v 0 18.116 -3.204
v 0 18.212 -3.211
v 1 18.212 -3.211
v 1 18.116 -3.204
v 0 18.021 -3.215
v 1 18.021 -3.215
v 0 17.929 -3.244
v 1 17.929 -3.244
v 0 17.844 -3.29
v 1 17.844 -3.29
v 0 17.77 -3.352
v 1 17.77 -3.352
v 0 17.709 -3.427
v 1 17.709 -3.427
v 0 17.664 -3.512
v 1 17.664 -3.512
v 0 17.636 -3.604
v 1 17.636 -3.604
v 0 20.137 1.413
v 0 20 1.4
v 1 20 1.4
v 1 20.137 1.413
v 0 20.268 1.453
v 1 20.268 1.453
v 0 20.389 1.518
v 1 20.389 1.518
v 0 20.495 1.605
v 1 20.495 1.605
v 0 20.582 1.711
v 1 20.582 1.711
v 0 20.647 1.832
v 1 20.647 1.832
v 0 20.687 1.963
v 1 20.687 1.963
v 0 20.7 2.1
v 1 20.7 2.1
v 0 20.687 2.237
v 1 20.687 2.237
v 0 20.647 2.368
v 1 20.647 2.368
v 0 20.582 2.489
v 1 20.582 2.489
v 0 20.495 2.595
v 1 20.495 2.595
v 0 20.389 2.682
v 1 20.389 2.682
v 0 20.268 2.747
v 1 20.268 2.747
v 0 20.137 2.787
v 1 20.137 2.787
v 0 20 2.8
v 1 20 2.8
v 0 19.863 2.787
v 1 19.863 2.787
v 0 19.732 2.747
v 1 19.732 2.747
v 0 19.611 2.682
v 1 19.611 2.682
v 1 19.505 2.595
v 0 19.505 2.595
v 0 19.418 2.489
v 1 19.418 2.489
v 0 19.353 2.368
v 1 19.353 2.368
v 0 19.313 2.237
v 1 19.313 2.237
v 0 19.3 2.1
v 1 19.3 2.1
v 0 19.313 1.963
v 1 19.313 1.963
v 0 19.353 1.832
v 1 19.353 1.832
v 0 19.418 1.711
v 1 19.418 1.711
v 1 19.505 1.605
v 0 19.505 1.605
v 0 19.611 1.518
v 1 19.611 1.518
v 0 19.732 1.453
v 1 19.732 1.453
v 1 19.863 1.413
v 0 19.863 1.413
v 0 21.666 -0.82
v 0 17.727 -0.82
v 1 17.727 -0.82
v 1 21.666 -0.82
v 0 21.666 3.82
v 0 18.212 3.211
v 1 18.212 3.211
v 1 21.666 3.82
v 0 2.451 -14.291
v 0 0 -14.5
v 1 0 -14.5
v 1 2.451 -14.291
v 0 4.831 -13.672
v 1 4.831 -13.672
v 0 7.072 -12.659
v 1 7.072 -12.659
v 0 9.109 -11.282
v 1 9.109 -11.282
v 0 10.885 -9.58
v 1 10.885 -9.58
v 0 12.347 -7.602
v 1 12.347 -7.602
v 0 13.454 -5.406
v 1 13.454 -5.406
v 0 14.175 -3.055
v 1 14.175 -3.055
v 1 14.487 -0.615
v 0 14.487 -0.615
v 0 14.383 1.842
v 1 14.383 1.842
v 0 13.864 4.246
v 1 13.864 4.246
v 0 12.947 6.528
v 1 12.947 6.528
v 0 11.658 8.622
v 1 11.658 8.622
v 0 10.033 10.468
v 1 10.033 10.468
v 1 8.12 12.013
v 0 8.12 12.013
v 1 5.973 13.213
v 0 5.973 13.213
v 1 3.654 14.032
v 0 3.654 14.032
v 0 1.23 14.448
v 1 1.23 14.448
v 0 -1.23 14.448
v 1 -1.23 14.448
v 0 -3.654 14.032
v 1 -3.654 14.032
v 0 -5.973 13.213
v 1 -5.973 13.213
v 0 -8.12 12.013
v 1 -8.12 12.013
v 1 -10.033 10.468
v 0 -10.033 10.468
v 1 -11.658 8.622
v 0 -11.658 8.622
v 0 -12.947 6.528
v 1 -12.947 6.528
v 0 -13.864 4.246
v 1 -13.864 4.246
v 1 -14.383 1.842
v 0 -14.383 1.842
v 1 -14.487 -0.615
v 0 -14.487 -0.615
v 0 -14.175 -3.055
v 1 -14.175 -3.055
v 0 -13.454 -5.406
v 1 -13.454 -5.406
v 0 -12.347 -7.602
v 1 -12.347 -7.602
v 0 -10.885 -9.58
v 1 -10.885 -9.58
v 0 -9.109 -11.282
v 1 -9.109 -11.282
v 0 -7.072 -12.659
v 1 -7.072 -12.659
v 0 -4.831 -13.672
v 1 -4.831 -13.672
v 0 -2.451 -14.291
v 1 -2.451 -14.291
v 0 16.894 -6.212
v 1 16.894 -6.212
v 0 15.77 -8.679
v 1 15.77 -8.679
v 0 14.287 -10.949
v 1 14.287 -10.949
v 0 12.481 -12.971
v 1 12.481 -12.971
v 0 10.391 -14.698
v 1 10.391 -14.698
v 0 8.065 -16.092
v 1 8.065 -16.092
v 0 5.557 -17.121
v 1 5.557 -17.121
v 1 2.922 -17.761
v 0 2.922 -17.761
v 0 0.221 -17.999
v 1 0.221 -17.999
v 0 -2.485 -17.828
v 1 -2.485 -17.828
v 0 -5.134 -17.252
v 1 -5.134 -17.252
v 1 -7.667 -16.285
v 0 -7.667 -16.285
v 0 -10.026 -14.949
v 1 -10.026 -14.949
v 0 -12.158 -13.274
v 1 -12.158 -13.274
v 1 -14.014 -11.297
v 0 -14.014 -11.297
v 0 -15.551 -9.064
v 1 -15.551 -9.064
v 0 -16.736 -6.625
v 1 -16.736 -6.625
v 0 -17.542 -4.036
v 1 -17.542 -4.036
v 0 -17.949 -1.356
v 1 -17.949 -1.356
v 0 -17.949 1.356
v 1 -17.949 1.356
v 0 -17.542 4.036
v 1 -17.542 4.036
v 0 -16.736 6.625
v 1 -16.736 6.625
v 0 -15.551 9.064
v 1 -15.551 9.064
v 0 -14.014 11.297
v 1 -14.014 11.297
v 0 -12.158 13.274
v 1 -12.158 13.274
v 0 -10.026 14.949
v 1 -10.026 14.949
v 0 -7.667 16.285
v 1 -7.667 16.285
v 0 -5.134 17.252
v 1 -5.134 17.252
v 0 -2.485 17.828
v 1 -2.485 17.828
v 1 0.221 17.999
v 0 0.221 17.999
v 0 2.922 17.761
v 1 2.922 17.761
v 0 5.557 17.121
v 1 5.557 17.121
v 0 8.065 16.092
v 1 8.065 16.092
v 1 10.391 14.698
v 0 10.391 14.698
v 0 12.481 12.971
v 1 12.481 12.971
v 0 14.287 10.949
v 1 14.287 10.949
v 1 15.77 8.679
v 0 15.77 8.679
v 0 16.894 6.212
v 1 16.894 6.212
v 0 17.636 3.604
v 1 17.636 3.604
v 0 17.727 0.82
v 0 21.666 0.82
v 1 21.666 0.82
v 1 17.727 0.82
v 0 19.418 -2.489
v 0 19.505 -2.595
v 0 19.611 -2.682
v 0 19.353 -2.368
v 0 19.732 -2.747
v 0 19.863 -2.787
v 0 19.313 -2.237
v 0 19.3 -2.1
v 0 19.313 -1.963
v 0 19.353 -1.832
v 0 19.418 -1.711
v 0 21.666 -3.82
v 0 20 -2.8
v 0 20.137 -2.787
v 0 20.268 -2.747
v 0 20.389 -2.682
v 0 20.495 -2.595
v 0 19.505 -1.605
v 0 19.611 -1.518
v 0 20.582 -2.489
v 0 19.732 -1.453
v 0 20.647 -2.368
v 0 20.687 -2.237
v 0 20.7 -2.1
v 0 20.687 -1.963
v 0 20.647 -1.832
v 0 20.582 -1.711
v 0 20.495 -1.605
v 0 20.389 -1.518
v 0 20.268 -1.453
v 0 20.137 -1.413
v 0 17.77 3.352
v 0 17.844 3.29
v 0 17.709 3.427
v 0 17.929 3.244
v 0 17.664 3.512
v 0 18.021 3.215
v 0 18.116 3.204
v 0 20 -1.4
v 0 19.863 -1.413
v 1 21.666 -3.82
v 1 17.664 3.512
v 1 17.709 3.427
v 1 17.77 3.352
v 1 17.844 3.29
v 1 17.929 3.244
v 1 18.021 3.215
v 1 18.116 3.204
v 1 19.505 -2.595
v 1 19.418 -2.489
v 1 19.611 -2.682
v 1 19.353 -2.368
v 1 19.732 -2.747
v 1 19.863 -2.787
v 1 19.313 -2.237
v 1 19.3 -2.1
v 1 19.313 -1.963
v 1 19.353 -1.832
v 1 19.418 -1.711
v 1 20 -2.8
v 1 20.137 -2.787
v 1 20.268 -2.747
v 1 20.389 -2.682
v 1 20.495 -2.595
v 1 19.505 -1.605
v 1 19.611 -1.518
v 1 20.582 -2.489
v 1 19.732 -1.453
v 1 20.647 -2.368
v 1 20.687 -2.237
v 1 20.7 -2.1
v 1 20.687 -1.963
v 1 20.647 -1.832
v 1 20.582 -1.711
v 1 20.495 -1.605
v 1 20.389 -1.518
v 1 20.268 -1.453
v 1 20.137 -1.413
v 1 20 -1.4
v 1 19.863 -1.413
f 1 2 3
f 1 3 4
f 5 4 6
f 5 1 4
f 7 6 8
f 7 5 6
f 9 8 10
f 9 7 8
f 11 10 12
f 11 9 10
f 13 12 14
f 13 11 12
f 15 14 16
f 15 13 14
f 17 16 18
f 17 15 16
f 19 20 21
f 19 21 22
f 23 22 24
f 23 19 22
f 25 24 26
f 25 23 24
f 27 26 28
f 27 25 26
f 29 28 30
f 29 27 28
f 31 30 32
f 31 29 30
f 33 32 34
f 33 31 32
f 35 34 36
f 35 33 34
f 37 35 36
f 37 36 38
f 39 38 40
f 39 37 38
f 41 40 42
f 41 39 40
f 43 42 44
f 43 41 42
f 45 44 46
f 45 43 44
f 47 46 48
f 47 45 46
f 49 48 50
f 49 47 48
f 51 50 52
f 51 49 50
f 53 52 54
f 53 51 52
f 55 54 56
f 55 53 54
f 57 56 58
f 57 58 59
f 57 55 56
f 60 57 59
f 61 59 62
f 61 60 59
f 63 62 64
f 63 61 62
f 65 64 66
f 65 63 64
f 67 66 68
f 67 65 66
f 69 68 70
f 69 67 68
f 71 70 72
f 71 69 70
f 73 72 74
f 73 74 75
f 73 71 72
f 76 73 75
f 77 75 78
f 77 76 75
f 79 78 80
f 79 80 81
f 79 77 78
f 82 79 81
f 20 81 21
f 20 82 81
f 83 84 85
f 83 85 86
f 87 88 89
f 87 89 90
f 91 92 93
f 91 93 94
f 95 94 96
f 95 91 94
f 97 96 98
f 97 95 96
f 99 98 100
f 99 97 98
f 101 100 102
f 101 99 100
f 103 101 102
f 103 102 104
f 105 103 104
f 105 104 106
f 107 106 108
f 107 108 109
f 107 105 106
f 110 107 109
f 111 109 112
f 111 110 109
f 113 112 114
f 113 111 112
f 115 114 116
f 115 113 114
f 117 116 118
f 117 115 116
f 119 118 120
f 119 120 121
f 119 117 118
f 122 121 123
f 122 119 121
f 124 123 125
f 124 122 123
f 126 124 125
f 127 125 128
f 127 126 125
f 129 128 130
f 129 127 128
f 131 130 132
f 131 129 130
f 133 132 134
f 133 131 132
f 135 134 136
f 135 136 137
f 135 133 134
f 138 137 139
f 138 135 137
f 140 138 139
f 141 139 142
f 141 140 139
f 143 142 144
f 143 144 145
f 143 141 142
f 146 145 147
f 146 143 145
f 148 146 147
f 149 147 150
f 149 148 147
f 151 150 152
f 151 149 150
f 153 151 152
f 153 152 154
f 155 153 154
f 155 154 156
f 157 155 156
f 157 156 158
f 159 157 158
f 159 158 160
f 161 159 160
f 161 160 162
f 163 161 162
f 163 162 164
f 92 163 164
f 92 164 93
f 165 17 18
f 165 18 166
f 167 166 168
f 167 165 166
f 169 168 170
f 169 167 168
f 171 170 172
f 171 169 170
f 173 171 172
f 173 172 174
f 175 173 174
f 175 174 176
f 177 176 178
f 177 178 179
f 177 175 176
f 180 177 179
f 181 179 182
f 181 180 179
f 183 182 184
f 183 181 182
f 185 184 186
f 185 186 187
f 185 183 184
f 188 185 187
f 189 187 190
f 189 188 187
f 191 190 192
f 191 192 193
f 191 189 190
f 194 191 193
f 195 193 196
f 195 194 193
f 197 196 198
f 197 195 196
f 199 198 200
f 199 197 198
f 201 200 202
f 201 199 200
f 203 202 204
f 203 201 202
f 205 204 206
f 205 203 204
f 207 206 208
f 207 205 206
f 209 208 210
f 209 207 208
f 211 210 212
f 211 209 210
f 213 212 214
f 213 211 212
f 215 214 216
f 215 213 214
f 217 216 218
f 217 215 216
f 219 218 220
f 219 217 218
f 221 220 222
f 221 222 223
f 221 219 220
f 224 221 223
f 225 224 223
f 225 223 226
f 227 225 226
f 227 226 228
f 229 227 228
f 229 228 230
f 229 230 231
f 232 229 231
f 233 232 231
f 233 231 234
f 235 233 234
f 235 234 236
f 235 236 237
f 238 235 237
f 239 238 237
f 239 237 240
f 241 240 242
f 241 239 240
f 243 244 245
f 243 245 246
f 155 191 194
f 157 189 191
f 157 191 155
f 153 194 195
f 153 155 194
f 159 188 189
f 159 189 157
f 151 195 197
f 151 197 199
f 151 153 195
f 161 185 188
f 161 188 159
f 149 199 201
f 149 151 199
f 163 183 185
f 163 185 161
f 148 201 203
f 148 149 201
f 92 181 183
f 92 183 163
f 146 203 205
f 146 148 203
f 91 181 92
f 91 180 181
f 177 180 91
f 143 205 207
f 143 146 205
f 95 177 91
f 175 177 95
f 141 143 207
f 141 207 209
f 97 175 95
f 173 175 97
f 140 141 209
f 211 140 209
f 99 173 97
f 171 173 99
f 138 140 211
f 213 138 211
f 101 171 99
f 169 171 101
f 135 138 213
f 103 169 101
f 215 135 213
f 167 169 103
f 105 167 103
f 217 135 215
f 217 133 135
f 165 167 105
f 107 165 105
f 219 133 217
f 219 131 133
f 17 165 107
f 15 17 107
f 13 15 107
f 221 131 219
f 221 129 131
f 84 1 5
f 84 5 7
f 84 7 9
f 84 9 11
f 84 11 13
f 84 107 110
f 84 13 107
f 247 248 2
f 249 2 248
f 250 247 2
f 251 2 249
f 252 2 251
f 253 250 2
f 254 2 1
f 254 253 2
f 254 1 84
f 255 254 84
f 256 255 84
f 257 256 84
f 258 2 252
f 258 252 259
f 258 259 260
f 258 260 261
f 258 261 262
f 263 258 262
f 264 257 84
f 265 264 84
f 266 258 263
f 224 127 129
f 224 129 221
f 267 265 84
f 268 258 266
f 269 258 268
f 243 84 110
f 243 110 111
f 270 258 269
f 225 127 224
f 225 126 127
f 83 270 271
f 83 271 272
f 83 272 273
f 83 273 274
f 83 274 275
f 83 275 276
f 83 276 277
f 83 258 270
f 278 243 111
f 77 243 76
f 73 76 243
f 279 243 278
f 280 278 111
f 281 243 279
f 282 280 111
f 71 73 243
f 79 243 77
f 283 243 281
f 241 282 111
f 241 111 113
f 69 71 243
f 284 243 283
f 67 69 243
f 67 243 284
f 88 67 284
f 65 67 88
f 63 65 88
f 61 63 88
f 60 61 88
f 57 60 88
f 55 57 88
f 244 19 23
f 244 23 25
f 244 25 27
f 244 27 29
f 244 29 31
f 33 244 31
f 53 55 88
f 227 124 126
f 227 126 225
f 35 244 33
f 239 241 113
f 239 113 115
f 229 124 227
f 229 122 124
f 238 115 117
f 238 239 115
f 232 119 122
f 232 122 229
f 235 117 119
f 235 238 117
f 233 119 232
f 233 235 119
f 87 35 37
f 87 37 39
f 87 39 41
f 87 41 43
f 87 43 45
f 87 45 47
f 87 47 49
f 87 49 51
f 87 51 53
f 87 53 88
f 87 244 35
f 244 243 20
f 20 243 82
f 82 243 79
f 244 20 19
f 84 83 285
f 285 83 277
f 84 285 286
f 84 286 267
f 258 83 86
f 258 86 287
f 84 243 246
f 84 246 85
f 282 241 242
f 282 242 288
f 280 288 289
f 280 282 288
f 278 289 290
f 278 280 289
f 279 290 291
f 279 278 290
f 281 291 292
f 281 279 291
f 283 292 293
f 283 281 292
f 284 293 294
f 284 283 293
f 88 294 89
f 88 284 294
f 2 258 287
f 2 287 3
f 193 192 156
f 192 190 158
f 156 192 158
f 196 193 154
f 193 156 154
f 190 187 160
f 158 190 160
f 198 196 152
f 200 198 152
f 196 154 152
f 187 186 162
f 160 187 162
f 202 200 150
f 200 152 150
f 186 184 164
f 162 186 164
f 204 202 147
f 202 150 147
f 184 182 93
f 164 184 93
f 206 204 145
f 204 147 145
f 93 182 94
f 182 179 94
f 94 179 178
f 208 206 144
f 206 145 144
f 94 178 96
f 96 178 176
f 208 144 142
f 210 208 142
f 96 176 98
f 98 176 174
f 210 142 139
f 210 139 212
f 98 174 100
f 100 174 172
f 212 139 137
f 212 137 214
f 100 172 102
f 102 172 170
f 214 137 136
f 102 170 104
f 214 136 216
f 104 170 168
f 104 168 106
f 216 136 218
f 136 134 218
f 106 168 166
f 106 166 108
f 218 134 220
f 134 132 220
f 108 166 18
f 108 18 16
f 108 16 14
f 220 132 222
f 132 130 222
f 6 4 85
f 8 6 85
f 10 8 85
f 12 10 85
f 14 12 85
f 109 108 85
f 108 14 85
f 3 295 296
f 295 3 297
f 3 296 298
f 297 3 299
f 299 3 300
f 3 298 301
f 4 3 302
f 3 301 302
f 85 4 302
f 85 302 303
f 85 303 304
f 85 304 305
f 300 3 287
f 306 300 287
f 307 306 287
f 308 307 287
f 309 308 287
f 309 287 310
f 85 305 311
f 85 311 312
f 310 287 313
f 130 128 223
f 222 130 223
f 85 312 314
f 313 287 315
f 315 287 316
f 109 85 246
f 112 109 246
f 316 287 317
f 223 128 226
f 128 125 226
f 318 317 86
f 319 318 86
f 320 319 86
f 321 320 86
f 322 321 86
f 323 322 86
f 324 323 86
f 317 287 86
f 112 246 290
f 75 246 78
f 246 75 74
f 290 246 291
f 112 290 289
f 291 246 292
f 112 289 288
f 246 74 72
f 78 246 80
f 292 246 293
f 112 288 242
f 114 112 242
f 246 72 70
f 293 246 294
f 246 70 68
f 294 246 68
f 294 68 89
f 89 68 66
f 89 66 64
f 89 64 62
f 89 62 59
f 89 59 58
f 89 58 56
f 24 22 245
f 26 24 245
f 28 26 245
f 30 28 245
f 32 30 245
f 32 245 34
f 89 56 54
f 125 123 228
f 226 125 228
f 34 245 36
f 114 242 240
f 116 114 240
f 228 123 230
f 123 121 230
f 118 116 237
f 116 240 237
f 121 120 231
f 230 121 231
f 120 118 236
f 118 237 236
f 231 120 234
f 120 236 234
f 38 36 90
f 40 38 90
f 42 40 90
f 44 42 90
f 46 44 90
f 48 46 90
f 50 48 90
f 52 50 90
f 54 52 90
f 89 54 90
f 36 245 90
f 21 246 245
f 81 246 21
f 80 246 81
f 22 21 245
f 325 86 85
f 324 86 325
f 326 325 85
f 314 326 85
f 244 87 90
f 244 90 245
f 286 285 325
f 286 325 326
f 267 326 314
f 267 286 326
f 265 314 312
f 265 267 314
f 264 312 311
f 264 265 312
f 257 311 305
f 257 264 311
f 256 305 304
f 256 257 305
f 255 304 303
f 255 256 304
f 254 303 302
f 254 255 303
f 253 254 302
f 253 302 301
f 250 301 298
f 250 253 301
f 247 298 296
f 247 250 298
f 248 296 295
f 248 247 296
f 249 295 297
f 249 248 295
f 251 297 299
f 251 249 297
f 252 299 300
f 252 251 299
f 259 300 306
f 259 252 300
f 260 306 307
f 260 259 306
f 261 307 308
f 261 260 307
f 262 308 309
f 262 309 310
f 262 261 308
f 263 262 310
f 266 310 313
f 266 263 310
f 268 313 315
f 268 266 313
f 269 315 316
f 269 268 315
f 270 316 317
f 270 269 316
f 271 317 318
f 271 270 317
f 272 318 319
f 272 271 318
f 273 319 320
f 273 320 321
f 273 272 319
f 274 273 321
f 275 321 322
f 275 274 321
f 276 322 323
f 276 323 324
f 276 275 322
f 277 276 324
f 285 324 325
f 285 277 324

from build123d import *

# Parameters (mm, degrees)
SKETCH_1_R      = 14.5
SKETCH_1_R_2    = 0.7
EXTRUDE_1_DEPTH = 1


with BuildPart() as part:
    # 草图1 → 凸台-拉伸1 (new body)
    with BuildSketch(Plane(origin=(0, 0, 0), x_dir=(0, 0, -1), z_dir=(1, 0, 0))):
        with BuildLine():
            Line((-3.211317774, 18.212288109), (-3.820259909, 21.665770566))
            Line((-3.820259909, 21.665770566), (-0.820259909, 21.665770566))
            Line((-0.820259909, 21.665770566), (-0.820259909, 17.726539554))
            Line((-0.820259909, 17.726539554), (0.820259909, 17.726539554))
            Line((0.820259909, 17.726539554), (0.820259909, 21.665770566))
            Line((0.820259909, 21.665770566), (3.820259909, 21.665770566))
            Line((3.820259909, 21.665770566), (3.211317774, 18.212288109))
            ThreePointArc((3.211317774, 18.212288109), (3.290307164, 17.84423731), (3.603621065, 17.635586614))
            ThreePointArc((3.603621065, 17.635586614), (0, -18), (-3.603621065, 17.635586614))
            ThreePointArc((-3.603621065, 17.635586614), (-3.290307164, 17.84423731), (-3.211317774, 18.212288109))
        make_face()
        Circle(SKETCH_1_R, mode=Mode.SUBTRACT)
        with Locations((-2.1, 20)):
            Circle(SKETCH_1_R_2, mode=Mode.SUBTRACT)
        with Locations(Location((2.1, 20, 0), (0, 0, 180))):
            Circle(SKETCH_1_R_2, mode=Mode.SUBTRACT)
    extrude(amount=EXTRUDE_1_DEPTH)


solid = part.part
